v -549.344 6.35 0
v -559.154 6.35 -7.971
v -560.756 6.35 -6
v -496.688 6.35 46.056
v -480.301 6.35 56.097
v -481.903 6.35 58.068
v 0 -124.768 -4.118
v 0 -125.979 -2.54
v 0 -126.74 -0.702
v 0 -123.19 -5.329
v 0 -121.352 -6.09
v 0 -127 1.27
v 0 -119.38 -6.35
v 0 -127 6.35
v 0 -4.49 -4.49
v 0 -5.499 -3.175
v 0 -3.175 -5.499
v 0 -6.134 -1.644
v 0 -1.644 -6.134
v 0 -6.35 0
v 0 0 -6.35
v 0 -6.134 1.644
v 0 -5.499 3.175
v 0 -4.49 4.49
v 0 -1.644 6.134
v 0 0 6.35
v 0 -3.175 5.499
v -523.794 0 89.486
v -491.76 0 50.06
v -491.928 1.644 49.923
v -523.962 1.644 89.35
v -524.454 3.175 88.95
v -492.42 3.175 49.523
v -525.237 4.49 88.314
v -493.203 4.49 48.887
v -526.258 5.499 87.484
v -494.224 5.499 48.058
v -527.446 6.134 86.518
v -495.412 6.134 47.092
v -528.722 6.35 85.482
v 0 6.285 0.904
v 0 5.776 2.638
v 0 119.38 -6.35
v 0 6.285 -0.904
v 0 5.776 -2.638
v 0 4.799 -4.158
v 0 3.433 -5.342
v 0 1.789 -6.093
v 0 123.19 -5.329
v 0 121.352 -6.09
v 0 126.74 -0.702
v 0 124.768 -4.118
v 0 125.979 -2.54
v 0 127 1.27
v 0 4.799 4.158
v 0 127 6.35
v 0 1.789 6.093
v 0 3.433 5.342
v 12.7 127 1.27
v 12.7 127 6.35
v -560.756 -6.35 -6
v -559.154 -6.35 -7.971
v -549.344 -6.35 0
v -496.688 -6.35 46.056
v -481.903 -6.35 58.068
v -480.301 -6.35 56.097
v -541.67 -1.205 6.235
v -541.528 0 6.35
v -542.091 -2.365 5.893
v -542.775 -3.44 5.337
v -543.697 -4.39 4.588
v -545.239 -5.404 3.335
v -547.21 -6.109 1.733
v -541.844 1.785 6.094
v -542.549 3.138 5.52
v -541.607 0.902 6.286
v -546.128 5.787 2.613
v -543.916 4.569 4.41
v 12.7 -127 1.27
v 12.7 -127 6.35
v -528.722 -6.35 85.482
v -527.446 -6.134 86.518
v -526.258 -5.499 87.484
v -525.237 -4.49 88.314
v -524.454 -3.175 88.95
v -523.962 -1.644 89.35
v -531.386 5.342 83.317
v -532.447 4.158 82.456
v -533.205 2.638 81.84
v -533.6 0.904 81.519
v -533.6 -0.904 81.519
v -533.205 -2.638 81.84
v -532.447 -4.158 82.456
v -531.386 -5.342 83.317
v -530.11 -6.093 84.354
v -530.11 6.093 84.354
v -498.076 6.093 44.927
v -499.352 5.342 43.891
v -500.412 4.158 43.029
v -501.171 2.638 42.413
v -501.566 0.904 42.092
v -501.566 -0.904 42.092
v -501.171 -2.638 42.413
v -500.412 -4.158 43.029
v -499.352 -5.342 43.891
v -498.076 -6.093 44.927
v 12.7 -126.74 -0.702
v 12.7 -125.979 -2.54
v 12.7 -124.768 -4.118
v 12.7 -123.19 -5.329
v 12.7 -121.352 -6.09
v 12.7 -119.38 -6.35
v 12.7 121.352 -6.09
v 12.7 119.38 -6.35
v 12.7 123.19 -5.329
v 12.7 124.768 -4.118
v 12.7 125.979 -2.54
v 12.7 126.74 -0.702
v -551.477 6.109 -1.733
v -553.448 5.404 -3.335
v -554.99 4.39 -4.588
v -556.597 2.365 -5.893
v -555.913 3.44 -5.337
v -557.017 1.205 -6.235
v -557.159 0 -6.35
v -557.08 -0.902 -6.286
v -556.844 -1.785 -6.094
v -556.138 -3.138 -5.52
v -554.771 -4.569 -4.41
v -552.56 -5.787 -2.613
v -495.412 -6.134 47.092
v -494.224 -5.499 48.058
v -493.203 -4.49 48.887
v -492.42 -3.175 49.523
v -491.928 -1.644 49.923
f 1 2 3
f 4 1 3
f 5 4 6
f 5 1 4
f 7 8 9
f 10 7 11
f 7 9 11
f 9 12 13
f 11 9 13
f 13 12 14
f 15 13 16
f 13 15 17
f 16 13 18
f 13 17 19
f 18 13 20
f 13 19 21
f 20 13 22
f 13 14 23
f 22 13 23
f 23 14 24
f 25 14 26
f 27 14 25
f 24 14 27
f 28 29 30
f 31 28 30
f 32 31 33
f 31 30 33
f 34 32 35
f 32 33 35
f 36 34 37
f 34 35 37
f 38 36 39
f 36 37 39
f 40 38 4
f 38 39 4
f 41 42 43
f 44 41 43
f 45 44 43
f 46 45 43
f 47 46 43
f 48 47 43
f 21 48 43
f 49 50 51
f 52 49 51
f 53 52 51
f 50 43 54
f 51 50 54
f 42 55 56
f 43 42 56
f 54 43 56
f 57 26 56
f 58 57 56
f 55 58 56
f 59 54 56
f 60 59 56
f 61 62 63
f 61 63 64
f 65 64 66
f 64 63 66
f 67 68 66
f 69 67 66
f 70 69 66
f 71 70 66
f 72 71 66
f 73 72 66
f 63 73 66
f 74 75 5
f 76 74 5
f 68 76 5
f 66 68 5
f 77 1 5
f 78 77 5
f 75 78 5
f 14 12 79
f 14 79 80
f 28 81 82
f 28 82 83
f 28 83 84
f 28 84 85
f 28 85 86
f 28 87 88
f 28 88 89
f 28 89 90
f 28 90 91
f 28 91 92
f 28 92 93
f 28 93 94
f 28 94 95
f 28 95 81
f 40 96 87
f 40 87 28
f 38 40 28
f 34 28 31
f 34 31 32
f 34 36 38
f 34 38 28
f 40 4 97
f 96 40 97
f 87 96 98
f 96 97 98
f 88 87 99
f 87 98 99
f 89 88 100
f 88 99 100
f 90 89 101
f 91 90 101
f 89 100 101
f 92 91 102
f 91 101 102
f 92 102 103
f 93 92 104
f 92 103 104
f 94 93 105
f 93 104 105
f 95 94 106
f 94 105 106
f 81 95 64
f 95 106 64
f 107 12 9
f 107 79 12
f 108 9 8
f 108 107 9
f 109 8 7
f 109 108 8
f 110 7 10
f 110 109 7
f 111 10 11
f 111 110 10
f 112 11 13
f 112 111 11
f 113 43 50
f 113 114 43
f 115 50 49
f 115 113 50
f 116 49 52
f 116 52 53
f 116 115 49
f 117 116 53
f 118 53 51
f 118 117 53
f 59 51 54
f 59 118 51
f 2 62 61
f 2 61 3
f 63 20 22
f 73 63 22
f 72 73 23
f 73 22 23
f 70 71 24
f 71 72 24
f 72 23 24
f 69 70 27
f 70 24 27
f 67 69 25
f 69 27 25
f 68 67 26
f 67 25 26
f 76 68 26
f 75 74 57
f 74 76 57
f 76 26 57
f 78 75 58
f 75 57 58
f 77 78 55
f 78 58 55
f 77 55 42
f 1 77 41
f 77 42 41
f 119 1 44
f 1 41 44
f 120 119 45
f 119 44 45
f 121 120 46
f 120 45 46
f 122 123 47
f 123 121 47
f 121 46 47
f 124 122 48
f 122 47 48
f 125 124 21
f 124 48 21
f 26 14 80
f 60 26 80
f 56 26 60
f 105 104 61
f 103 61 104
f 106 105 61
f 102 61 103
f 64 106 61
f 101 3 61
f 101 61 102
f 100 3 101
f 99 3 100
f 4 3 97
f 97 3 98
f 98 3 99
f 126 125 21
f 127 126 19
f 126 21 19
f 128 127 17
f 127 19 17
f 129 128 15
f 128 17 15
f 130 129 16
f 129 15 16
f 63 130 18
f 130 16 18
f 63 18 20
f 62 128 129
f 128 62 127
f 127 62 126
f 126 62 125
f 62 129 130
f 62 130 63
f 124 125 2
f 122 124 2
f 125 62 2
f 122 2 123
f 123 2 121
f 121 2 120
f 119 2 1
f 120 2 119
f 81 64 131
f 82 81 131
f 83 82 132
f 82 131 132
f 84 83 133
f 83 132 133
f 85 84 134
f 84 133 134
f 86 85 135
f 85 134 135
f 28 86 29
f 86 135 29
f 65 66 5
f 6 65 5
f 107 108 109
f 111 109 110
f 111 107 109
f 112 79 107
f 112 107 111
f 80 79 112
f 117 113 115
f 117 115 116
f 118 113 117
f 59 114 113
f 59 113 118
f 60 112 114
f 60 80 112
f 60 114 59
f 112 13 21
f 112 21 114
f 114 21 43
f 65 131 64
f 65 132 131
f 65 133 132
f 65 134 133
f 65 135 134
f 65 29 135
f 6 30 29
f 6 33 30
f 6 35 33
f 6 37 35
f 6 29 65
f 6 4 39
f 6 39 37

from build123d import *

# Parameters (mm, degrees)
F0_W      = 254
F0_H      = 12.7
F1_DEPTH  = 12.7
F3_DEPTH  = 558.8
F4_R      = 7.62
F6_DEPTH  = 12.7
F7_W      = 101.6
F7_H      = 12.7
F8_DEPTH  = 2.54
F10_DEPTH = 50.8


with BuildPart() as f1:
    # F0 (on Right) → F1 (new body)
    with BuildSketch(Plane.YZ):
        Rectangle(F0_W, F0_H)
    extrude(amount=F1_DEPTH)

    # F2 (on face) → F3 (join)
    with BuildSketch(Plane(origin=(0, 0, 0), x_dir=(0, -1, 0), z_dir=(-1, 0, 0))):
        with BuildLine():
            ThreePointArc((-6.84e-08, -6.35), (4.4901280364, -4.4901280847), (6.35, 0))
            ThreePointArc((6.35, 0), (4.4901280521, 4.4901280689), (-2.37e-08, 6.35))
            ThreePointArc((-2.37e-08, 6.35), (-6.35, 2.23e-08), (-6.84e-08, -6.35))
        make_face()
    extrude(amount=F3_DEPTH)

    # F4
    f4_edges = [f1.edges().sort_by_distance(p)[0] for p in [
        (6.35, -127, -6.35),
        (6.35, 127, -6.35),
    ]]
    fillet(f4_edges, radius=F4_R)

    # F5 (on Front) → F6 (cut, symmetric)
    with BuildSketch(Plane.XZ):
        Polygon((-541.0905659676, 6.7056384869), (-558.8, 6.7056384869), (-558.8, -7.6832813211), align=None)
    extrude(amount=F6_DEPTH, both=True, mode=Mode.SUBTRACT)

    # F7 (on face) → F8 (join)
    with BuildSketch(Plane(origin=(-218.4449745832, 0, 268.8552663249), x_dir=(0.7761139002, 0, 0.630592748), z_dir=(-0.630592748, 0, 0.7761139002))):
        with Locations((-388.1941093914, 0)):
            Rectangle(F7_W, F7_H)
    extrude(amount=F8_DEPTH)

    # F9 (on face) → F10 (join)
    with BuildSketch(Plane(origin=(-220.0466801631, 0, 270.8265956315), x_dir=(0.7761139002, 0, 0.630592748), z_dir=(-0.630592748, 0, 0.7761139002))):
        with BuildLine():
            ThreePointArc((-356.4441093914, -6.35), (-351.9539813308, -4.4901280605), (-350.0941093914, 0))
            ThreePointArc((-350.0941093914, 0), (-351.9539813308, 4.4901280605), (-356.4441093914, 6.35))
            ThreePointArc((-356.4441093914, 6.35), (-362.7941093914, 0), (-356.4441093914, -6.35))
        make_face()
    extrude(amount=F10_DEPTH)


solid = f1.part
